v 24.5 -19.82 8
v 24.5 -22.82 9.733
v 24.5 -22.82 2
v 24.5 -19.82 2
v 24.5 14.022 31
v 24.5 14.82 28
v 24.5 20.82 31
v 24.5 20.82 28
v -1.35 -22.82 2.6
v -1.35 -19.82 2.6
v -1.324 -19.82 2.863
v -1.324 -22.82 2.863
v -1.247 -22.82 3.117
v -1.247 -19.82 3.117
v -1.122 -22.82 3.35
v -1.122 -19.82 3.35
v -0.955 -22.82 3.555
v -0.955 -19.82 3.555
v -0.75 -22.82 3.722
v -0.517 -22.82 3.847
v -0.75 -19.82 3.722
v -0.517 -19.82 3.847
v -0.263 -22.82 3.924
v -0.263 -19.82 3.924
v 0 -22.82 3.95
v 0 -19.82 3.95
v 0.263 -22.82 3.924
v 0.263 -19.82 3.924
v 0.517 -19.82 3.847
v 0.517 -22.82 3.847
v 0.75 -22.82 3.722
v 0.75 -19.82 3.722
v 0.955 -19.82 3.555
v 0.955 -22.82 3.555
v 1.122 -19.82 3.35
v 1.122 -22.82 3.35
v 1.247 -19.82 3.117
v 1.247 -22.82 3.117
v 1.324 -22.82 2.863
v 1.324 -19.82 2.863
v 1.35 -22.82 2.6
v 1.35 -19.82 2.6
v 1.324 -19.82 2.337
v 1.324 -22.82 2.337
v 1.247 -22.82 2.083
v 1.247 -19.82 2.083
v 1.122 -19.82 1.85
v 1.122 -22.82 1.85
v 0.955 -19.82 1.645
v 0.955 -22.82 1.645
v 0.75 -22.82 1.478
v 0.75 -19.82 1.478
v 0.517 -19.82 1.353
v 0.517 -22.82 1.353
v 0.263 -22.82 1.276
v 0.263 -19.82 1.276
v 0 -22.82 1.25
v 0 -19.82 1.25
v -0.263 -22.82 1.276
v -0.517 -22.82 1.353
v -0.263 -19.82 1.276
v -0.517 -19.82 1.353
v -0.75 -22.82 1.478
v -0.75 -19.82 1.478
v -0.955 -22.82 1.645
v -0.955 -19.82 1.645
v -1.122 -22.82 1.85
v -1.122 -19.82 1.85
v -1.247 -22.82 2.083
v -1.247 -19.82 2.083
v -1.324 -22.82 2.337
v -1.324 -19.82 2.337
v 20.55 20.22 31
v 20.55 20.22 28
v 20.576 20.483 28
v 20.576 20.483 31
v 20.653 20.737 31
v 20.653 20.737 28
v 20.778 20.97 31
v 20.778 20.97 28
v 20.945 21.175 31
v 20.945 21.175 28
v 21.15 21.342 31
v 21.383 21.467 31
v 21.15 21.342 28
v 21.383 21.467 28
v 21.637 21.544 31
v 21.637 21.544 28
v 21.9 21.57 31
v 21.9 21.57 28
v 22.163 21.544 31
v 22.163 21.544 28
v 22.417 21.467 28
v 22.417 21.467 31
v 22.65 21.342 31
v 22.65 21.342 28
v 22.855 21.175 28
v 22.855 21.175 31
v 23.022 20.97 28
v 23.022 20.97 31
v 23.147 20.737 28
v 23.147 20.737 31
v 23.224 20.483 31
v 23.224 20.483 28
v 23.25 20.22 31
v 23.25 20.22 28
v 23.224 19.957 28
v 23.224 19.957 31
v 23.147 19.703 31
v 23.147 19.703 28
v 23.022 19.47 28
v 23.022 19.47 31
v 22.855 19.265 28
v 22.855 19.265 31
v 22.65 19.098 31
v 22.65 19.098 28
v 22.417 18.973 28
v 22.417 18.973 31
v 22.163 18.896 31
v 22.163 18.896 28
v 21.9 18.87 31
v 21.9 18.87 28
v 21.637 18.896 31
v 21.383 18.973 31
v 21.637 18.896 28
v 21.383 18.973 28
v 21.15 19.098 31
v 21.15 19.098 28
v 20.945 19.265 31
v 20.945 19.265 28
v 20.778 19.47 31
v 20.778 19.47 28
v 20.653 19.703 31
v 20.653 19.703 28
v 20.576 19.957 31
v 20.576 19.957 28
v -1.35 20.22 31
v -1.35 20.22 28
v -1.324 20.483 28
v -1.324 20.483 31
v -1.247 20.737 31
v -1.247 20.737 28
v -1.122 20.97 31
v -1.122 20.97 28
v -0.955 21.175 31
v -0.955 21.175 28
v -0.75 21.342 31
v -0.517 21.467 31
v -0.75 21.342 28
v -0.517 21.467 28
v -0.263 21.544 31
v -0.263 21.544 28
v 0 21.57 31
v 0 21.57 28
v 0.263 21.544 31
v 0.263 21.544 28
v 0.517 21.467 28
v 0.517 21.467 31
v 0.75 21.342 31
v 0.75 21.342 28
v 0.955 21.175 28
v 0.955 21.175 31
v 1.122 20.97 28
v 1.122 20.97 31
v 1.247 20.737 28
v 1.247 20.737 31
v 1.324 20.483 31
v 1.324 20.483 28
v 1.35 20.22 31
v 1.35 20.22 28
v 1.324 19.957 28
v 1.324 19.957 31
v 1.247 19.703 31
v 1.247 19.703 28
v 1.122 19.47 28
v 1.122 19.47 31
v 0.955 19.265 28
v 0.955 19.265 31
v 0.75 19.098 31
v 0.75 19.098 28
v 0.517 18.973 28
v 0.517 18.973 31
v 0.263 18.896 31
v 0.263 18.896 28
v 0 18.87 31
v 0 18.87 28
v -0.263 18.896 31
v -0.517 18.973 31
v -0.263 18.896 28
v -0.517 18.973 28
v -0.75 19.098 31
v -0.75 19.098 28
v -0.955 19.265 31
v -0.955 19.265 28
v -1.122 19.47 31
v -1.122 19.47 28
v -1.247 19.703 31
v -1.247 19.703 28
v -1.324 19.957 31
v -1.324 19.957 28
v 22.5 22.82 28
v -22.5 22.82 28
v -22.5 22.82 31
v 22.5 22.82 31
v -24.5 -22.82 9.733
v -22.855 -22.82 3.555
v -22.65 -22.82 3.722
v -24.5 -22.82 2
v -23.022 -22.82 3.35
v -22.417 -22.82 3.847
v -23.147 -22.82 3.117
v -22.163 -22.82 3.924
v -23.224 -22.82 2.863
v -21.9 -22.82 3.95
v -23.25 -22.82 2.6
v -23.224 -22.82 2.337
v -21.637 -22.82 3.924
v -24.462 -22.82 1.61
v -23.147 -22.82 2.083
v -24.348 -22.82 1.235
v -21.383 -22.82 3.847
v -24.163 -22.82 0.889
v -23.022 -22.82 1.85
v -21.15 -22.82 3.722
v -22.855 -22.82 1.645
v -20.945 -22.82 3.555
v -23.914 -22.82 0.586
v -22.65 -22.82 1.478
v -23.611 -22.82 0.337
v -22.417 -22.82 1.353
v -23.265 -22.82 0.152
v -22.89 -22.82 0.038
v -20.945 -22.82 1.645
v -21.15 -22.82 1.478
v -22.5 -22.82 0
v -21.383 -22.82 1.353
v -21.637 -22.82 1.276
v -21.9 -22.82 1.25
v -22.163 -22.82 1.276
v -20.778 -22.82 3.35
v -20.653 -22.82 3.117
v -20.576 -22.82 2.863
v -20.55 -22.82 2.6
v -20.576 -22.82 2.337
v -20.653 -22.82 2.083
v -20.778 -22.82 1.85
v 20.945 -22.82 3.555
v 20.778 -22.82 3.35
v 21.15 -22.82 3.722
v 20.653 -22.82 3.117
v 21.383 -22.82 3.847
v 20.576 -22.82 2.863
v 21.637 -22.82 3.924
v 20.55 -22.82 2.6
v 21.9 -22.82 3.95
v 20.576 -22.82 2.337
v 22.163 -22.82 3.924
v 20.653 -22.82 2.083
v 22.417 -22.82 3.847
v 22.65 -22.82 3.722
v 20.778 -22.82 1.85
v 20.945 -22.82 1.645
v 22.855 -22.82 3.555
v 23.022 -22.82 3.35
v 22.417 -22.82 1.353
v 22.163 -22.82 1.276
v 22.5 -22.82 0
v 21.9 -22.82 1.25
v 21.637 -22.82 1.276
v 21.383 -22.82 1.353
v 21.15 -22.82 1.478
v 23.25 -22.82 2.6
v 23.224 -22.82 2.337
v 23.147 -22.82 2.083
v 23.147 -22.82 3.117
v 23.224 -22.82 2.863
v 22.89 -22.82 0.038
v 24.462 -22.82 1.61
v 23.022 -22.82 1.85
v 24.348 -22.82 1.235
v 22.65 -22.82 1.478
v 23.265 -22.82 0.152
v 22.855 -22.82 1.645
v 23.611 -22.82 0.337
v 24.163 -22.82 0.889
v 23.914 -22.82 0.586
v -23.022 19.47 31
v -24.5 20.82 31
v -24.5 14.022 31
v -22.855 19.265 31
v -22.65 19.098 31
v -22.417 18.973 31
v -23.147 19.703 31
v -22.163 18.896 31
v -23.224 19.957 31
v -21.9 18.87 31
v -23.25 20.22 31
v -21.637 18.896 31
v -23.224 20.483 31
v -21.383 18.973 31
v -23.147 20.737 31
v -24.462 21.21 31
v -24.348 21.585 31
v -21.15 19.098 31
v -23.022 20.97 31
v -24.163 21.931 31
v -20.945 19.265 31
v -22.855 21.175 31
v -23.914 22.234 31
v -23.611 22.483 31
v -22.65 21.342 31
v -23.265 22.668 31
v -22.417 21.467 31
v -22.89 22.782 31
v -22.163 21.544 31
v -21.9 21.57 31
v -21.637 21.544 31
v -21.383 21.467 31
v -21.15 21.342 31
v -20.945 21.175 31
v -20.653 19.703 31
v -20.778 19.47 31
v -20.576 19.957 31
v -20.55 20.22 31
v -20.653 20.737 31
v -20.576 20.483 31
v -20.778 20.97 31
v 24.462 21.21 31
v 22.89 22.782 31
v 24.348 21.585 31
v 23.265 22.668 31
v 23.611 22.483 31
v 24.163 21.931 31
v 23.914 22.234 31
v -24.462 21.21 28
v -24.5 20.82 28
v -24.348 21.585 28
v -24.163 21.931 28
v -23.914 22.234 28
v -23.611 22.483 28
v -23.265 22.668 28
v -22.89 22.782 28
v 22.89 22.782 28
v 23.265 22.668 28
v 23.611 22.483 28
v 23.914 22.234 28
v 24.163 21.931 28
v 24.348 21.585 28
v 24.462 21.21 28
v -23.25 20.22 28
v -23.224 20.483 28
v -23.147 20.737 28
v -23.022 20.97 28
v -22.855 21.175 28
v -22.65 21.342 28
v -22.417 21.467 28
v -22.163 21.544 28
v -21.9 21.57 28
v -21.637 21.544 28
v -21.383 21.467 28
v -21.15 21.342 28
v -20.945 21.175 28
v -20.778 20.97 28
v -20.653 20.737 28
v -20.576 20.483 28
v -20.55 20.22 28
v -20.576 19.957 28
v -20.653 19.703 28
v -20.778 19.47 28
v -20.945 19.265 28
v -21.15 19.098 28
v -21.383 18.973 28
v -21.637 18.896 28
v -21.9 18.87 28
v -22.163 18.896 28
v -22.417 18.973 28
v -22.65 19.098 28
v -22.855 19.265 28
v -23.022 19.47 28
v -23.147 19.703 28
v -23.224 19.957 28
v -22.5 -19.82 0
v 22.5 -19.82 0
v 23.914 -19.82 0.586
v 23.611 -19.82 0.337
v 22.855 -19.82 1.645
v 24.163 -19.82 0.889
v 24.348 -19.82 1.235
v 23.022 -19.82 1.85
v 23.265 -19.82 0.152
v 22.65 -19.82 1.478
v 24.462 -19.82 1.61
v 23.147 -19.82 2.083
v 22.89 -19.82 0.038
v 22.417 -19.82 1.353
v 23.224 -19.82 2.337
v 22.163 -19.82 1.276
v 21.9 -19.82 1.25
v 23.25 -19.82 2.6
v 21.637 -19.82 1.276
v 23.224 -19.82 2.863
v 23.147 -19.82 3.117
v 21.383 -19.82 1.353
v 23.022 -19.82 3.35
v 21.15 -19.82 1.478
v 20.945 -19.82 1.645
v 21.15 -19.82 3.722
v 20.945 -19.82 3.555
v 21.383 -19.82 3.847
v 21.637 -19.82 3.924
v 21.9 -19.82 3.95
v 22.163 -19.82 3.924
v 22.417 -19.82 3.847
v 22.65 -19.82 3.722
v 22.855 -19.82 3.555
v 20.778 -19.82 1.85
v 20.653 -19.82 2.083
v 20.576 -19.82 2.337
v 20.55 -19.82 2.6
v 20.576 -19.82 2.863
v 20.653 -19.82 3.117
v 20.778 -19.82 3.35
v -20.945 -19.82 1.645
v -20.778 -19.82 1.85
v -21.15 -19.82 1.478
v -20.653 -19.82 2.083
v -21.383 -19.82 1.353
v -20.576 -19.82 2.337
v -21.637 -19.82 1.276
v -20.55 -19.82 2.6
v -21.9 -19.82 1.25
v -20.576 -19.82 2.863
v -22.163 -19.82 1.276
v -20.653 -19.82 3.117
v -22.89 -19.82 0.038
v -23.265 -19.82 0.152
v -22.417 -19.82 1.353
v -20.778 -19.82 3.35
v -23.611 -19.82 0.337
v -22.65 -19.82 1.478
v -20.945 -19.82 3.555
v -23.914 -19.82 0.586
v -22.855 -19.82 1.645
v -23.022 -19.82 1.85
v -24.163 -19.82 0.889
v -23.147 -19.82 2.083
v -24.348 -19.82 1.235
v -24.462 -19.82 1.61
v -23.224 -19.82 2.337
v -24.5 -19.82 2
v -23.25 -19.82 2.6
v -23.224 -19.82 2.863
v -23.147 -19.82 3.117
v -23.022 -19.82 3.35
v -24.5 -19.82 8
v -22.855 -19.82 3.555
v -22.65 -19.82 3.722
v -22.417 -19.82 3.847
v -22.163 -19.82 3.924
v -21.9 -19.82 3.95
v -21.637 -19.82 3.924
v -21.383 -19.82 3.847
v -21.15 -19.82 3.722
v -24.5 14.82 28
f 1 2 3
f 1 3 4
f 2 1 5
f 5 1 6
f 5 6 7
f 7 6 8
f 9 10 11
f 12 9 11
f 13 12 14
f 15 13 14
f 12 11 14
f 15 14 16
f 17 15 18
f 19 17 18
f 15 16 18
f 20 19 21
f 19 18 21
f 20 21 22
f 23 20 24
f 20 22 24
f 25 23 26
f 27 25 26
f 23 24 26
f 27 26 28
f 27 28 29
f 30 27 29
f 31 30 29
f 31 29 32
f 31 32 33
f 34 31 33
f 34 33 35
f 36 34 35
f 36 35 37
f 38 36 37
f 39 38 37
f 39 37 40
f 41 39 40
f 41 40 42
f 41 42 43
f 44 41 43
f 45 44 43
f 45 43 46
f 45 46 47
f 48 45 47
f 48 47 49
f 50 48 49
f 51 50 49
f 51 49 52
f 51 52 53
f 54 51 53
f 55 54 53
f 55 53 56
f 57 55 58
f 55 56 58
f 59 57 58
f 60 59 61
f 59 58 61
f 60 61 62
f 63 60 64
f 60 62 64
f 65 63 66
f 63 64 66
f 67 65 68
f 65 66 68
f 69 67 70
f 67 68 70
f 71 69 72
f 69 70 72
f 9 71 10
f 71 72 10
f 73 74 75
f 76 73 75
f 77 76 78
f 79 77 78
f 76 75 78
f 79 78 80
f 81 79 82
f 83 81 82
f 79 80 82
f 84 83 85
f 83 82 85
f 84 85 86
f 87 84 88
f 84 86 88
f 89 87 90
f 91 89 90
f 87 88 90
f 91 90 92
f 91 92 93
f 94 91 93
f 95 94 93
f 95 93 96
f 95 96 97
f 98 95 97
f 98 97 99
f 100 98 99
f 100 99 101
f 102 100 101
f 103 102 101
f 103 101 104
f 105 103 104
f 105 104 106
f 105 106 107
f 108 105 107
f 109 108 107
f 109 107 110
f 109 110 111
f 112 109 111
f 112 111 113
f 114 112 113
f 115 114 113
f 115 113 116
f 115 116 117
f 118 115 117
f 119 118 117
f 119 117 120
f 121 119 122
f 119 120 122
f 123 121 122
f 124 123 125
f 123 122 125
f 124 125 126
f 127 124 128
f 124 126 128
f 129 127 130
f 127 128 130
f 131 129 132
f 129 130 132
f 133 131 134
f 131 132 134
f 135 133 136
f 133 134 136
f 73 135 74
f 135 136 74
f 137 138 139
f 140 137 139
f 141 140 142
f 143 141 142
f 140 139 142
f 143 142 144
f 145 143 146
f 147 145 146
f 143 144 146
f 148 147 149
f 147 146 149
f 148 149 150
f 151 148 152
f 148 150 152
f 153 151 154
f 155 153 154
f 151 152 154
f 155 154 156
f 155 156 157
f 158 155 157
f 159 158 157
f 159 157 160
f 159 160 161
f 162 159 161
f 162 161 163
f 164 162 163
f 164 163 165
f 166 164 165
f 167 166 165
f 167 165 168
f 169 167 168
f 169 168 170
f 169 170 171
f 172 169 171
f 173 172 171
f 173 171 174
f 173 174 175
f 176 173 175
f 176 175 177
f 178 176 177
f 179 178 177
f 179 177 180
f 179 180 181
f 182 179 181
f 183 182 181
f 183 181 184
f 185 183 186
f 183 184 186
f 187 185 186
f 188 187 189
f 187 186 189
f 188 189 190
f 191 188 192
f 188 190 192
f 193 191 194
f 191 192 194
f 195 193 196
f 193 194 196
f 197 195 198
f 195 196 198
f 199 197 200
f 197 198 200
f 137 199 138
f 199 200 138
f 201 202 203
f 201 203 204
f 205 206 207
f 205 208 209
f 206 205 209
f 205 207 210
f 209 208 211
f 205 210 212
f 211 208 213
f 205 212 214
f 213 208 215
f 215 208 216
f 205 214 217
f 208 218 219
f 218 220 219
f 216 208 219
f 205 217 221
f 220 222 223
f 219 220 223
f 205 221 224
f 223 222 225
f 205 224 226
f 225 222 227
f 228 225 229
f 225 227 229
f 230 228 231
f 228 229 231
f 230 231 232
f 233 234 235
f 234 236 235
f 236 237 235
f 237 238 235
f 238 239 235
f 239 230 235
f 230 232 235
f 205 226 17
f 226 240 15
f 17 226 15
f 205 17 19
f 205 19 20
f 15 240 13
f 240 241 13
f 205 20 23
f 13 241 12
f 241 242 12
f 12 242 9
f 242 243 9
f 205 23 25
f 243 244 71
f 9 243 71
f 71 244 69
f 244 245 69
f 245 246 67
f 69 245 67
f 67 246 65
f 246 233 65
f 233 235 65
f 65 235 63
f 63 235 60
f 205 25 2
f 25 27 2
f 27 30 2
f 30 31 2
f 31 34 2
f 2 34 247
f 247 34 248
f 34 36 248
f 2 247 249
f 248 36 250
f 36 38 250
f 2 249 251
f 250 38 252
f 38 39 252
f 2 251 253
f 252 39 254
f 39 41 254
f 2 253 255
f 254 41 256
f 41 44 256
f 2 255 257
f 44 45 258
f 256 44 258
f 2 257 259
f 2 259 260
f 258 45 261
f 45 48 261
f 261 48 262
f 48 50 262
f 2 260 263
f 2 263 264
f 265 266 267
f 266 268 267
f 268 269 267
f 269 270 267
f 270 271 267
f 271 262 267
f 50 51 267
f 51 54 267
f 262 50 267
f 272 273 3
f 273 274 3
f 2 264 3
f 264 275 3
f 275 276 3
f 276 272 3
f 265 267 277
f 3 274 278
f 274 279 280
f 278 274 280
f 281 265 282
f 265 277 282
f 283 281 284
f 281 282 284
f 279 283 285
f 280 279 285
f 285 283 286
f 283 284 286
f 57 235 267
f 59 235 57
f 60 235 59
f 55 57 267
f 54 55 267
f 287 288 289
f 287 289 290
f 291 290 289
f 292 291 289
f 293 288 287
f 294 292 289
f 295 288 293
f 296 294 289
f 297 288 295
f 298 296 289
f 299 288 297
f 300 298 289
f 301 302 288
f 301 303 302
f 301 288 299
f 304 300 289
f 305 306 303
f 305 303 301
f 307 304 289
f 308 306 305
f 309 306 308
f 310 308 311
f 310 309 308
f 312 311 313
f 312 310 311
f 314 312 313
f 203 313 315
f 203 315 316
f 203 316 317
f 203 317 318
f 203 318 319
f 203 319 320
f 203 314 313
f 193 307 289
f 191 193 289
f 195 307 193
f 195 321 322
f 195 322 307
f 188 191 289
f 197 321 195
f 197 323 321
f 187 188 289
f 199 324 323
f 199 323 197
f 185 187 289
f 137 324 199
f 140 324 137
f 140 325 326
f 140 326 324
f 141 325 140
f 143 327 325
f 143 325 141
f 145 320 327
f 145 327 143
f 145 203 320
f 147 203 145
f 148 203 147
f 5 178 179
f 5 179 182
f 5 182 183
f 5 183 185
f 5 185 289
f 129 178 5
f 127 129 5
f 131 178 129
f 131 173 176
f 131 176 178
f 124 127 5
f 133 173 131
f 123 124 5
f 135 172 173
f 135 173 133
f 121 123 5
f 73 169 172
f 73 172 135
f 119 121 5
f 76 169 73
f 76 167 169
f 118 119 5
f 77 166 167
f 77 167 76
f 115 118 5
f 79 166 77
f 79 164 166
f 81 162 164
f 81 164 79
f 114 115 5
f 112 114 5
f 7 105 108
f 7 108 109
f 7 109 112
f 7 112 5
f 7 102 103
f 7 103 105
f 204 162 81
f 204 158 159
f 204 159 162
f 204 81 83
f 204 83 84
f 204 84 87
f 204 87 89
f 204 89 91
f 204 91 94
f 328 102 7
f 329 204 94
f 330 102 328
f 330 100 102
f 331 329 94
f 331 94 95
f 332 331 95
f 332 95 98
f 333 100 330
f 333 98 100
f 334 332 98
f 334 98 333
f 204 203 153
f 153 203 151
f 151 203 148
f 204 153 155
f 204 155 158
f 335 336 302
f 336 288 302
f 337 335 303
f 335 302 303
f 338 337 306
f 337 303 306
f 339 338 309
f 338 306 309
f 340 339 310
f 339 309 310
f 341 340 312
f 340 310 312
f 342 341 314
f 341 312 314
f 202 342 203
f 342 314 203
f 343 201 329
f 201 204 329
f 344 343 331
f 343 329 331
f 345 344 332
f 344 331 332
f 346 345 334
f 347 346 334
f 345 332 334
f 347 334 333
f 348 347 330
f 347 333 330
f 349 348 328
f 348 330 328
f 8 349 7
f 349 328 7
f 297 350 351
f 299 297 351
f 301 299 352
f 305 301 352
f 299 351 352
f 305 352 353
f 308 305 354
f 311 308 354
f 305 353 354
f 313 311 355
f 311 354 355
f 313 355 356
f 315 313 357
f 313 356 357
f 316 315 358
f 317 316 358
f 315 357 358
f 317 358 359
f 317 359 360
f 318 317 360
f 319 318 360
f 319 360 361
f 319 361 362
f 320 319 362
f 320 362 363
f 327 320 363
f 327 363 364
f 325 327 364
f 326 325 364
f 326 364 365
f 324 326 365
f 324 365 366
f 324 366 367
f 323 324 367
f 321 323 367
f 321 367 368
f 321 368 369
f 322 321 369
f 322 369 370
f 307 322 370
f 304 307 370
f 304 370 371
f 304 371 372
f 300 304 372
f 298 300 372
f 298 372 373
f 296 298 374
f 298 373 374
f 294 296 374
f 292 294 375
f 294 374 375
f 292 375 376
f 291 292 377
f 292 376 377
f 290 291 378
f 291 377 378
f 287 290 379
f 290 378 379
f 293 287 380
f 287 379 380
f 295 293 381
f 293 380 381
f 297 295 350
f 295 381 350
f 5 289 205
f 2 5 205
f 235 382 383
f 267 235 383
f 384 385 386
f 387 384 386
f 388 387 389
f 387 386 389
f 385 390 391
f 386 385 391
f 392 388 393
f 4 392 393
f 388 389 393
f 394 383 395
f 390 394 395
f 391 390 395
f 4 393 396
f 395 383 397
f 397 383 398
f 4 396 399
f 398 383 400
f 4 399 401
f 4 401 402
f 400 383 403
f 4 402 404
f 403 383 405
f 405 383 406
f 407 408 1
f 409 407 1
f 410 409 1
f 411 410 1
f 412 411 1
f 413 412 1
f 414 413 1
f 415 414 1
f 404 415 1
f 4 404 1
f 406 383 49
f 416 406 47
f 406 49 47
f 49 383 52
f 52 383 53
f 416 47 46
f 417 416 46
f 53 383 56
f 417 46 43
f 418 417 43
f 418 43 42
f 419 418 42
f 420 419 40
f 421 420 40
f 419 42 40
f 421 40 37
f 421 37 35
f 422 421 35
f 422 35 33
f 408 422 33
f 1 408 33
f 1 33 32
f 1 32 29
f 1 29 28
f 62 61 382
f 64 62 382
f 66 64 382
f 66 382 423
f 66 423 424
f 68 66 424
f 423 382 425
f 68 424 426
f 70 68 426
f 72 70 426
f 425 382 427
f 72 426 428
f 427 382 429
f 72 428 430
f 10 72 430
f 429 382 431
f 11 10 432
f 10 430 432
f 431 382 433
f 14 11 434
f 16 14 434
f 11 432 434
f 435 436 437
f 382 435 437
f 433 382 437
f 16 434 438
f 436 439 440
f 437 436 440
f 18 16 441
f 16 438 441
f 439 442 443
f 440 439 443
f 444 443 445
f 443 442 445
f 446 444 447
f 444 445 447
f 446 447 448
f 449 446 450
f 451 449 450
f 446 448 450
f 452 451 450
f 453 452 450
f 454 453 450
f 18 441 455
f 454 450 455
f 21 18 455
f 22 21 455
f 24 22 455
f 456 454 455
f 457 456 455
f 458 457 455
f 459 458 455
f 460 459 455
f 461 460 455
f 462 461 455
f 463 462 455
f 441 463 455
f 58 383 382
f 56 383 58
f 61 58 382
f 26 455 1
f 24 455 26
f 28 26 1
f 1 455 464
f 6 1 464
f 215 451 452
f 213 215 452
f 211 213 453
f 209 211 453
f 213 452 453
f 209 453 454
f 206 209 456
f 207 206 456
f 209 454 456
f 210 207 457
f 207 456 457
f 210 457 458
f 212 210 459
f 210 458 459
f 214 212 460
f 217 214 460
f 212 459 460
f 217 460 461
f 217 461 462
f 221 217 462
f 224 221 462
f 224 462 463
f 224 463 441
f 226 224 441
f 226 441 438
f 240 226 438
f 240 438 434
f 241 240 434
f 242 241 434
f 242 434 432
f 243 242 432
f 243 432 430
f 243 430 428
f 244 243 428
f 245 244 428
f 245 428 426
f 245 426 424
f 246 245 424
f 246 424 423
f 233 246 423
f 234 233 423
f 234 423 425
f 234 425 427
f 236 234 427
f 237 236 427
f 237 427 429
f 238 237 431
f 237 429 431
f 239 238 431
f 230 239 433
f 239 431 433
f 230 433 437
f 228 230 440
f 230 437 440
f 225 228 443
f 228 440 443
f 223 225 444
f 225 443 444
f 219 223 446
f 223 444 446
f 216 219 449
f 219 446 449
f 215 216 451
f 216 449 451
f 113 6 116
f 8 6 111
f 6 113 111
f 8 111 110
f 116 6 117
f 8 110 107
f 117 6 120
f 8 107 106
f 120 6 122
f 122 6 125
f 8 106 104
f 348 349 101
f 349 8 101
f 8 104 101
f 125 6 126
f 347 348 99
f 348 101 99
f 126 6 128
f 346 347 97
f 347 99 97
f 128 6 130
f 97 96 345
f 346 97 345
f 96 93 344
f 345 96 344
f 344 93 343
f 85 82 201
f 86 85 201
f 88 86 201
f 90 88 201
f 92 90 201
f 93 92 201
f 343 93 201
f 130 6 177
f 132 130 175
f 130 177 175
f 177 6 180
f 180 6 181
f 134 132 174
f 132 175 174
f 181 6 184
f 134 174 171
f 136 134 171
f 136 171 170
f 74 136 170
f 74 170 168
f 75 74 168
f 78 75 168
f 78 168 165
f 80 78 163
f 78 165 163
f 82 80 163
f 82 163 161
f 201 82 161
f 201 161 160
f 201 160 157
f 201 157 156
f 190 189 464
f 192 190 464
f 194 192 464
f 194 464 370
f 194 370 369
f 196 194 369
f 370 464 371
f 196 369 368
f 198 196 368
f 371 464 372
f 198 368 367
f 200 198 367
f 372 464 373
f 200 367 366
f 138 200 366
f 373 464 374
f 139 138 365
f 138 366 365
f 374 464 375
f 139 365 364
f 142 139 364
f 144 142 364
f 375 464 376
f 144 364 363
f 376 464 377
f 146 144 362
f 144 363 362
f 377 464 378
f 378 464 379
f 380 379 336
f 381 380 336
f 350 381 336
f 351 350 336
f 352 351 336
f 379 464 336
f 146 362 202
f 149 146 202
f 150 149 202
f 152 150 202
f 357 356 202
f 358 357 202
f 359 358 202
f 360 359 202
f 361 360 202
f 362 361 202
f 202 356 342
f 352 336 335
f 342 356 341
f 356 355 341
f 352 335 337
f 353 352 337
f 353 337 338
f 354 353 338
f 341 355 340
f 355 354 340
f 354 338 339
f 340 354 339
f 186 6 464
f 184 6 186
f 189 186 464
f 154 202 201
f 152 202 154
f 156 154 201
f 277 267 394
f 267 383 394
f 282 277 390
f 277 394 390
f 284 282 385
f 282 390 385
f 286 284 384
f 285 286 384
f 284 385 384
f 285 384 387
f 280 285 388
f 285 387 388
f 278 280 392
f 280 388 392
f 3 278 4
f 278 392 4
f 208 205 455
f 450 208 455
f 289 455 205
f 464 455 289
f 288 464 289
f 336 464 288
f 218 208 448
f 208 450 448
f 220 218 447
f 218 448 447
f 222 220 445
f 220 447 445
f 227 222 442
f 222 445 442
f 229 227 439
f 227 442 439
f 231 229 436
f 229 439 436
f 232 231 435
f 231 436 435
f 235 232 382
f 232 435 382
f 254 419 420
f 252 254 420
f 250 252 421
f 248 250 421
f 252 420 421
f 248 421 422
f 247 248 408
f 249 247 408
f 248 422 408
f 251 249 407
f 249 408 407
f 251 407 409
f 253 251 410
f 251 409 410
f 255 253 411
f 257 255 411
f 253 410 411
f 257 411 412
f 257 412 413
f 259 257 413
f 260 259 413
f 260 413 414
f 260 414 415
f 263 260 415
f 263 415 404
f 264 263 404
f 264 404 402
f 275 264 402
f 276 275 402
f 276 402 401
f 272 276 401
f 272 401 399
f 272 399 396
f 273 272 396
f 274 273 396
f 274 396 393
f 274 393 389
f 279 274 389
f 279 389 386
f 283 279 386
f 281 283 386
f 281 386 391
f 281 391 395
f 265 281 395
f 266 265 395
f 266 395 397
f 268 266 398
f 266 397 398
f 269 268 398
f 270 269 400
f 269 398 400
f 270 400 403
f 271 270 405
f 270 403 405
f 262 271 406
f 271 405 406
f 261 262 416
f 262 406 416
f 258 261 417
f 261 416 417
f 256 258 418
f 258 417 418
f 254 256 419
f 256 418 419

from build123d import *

# Parameters (mm, degrees)
ESBO_O1_W                = 49
ESBO_O1_H                = 45.64
RESSALTO_EXTRUS_O1_DEPTH = 31
CORTE_EXTRUS_O1_DEPTH    = 63.311735652
CORTE_EXTRUS_O2_DEPTH    = 63.311735652
ESBO_O5_R                = 1.35
CORTE_EXTRUS_O4_DEPTH    = 59.132775609
ESBO_O6_R                = 1.35
CORTE_EXTRUS_O5_DEPTH    = 44.646333179
FILETE1_R                = 2


with BuildPart() as part:
    # Esboço1 → Ressalto-extrusão1 (new body)
    with BuildSketch(Plane.XY):
        Rectangle(ESBO_O1_W, ESBO_O1_H)
    extrude(amount=RESSALTO_EXTRUS_O1_DEPTH)

    # Esboço2 → Corte-extrusão1 (cut, through all)
    with BuildSketch(Plane.ZY.offset(24.5)):
        Polygon((9.732649273, -22.82), (31, -22.82), (31, 14.022250108), align=None)
    extrude(amount=-CORTE_EXTRUS_O1_DEPTH, mode=Mode.SUBTRACT)

    # Esboço3 → Corte-extrusão2 (cut, through all)
    with BuildSketch(Plane.ZY.offset(24.5)):
        Polygon((0, -19.82), (8, -19.82), (28, 14.82), (28, 22.82), (0, 22.82), align=None)
    extrude(amount=-CORTE_EXTRUS_O2_DEPTH, mode=Mode.SUBTRACT)

    # Esboço5 → Corte-extrusão4 (cut, through all)
    with BuildSketch(Plane(origin=(0, -19.82, 0), x_dir=(1, 0, 0), z_dir=(0, 1, 0))):
        with Locations(Location((21.9, -2.6, 0), (0, 0, 180))):
            Circle(ESBO_O5_R)
        with Locations(Location((0, -2.6, 0), (0, 0, 180))):
            Circle(ESBO_O5_R)
        with Locations(Location((-21.9, -2.6, 0), (0, 0, 180))):
            Circle(ESBO_O5_R)
    extrude(amount=-CORTE_EXTRUS_O4_DEPTH, mode=Mode.SUBTRACT)

    # Esboço6 → Corte-extrusão5 (cut, through all)
    with BuildSketch(Plane(origin=(0, 0, 28), x_dir=(-1, 0, 0), z_dir=(0, 0, -1))):
        with Locations((21.9, 20.22)):
            Circle(ESBO_O6_R)
        with Locations((0, 20.22)):
            Circle(ESBO_O6_R)
        with Locations((-21.9, 20.22)):
            Circle(ESBO_O6_R)
    extrude(amount=-CORTE_EXTRUS_O5_DEPTH, mode=Mode.SUBTRACT)

    # Filete1
    filete1_edges = [part.edges().sort_by_distance(p)[0] for p in [
        (-24.5, -21.32, 0),
        (24.5, -21.32, 0),
        (-24.5, 22.82, 29.5),
        (24.5, 22.82, 29.5),
    ]]
    fillet(filete1_edges, radius=FILETE1_R)


solid = part.part
